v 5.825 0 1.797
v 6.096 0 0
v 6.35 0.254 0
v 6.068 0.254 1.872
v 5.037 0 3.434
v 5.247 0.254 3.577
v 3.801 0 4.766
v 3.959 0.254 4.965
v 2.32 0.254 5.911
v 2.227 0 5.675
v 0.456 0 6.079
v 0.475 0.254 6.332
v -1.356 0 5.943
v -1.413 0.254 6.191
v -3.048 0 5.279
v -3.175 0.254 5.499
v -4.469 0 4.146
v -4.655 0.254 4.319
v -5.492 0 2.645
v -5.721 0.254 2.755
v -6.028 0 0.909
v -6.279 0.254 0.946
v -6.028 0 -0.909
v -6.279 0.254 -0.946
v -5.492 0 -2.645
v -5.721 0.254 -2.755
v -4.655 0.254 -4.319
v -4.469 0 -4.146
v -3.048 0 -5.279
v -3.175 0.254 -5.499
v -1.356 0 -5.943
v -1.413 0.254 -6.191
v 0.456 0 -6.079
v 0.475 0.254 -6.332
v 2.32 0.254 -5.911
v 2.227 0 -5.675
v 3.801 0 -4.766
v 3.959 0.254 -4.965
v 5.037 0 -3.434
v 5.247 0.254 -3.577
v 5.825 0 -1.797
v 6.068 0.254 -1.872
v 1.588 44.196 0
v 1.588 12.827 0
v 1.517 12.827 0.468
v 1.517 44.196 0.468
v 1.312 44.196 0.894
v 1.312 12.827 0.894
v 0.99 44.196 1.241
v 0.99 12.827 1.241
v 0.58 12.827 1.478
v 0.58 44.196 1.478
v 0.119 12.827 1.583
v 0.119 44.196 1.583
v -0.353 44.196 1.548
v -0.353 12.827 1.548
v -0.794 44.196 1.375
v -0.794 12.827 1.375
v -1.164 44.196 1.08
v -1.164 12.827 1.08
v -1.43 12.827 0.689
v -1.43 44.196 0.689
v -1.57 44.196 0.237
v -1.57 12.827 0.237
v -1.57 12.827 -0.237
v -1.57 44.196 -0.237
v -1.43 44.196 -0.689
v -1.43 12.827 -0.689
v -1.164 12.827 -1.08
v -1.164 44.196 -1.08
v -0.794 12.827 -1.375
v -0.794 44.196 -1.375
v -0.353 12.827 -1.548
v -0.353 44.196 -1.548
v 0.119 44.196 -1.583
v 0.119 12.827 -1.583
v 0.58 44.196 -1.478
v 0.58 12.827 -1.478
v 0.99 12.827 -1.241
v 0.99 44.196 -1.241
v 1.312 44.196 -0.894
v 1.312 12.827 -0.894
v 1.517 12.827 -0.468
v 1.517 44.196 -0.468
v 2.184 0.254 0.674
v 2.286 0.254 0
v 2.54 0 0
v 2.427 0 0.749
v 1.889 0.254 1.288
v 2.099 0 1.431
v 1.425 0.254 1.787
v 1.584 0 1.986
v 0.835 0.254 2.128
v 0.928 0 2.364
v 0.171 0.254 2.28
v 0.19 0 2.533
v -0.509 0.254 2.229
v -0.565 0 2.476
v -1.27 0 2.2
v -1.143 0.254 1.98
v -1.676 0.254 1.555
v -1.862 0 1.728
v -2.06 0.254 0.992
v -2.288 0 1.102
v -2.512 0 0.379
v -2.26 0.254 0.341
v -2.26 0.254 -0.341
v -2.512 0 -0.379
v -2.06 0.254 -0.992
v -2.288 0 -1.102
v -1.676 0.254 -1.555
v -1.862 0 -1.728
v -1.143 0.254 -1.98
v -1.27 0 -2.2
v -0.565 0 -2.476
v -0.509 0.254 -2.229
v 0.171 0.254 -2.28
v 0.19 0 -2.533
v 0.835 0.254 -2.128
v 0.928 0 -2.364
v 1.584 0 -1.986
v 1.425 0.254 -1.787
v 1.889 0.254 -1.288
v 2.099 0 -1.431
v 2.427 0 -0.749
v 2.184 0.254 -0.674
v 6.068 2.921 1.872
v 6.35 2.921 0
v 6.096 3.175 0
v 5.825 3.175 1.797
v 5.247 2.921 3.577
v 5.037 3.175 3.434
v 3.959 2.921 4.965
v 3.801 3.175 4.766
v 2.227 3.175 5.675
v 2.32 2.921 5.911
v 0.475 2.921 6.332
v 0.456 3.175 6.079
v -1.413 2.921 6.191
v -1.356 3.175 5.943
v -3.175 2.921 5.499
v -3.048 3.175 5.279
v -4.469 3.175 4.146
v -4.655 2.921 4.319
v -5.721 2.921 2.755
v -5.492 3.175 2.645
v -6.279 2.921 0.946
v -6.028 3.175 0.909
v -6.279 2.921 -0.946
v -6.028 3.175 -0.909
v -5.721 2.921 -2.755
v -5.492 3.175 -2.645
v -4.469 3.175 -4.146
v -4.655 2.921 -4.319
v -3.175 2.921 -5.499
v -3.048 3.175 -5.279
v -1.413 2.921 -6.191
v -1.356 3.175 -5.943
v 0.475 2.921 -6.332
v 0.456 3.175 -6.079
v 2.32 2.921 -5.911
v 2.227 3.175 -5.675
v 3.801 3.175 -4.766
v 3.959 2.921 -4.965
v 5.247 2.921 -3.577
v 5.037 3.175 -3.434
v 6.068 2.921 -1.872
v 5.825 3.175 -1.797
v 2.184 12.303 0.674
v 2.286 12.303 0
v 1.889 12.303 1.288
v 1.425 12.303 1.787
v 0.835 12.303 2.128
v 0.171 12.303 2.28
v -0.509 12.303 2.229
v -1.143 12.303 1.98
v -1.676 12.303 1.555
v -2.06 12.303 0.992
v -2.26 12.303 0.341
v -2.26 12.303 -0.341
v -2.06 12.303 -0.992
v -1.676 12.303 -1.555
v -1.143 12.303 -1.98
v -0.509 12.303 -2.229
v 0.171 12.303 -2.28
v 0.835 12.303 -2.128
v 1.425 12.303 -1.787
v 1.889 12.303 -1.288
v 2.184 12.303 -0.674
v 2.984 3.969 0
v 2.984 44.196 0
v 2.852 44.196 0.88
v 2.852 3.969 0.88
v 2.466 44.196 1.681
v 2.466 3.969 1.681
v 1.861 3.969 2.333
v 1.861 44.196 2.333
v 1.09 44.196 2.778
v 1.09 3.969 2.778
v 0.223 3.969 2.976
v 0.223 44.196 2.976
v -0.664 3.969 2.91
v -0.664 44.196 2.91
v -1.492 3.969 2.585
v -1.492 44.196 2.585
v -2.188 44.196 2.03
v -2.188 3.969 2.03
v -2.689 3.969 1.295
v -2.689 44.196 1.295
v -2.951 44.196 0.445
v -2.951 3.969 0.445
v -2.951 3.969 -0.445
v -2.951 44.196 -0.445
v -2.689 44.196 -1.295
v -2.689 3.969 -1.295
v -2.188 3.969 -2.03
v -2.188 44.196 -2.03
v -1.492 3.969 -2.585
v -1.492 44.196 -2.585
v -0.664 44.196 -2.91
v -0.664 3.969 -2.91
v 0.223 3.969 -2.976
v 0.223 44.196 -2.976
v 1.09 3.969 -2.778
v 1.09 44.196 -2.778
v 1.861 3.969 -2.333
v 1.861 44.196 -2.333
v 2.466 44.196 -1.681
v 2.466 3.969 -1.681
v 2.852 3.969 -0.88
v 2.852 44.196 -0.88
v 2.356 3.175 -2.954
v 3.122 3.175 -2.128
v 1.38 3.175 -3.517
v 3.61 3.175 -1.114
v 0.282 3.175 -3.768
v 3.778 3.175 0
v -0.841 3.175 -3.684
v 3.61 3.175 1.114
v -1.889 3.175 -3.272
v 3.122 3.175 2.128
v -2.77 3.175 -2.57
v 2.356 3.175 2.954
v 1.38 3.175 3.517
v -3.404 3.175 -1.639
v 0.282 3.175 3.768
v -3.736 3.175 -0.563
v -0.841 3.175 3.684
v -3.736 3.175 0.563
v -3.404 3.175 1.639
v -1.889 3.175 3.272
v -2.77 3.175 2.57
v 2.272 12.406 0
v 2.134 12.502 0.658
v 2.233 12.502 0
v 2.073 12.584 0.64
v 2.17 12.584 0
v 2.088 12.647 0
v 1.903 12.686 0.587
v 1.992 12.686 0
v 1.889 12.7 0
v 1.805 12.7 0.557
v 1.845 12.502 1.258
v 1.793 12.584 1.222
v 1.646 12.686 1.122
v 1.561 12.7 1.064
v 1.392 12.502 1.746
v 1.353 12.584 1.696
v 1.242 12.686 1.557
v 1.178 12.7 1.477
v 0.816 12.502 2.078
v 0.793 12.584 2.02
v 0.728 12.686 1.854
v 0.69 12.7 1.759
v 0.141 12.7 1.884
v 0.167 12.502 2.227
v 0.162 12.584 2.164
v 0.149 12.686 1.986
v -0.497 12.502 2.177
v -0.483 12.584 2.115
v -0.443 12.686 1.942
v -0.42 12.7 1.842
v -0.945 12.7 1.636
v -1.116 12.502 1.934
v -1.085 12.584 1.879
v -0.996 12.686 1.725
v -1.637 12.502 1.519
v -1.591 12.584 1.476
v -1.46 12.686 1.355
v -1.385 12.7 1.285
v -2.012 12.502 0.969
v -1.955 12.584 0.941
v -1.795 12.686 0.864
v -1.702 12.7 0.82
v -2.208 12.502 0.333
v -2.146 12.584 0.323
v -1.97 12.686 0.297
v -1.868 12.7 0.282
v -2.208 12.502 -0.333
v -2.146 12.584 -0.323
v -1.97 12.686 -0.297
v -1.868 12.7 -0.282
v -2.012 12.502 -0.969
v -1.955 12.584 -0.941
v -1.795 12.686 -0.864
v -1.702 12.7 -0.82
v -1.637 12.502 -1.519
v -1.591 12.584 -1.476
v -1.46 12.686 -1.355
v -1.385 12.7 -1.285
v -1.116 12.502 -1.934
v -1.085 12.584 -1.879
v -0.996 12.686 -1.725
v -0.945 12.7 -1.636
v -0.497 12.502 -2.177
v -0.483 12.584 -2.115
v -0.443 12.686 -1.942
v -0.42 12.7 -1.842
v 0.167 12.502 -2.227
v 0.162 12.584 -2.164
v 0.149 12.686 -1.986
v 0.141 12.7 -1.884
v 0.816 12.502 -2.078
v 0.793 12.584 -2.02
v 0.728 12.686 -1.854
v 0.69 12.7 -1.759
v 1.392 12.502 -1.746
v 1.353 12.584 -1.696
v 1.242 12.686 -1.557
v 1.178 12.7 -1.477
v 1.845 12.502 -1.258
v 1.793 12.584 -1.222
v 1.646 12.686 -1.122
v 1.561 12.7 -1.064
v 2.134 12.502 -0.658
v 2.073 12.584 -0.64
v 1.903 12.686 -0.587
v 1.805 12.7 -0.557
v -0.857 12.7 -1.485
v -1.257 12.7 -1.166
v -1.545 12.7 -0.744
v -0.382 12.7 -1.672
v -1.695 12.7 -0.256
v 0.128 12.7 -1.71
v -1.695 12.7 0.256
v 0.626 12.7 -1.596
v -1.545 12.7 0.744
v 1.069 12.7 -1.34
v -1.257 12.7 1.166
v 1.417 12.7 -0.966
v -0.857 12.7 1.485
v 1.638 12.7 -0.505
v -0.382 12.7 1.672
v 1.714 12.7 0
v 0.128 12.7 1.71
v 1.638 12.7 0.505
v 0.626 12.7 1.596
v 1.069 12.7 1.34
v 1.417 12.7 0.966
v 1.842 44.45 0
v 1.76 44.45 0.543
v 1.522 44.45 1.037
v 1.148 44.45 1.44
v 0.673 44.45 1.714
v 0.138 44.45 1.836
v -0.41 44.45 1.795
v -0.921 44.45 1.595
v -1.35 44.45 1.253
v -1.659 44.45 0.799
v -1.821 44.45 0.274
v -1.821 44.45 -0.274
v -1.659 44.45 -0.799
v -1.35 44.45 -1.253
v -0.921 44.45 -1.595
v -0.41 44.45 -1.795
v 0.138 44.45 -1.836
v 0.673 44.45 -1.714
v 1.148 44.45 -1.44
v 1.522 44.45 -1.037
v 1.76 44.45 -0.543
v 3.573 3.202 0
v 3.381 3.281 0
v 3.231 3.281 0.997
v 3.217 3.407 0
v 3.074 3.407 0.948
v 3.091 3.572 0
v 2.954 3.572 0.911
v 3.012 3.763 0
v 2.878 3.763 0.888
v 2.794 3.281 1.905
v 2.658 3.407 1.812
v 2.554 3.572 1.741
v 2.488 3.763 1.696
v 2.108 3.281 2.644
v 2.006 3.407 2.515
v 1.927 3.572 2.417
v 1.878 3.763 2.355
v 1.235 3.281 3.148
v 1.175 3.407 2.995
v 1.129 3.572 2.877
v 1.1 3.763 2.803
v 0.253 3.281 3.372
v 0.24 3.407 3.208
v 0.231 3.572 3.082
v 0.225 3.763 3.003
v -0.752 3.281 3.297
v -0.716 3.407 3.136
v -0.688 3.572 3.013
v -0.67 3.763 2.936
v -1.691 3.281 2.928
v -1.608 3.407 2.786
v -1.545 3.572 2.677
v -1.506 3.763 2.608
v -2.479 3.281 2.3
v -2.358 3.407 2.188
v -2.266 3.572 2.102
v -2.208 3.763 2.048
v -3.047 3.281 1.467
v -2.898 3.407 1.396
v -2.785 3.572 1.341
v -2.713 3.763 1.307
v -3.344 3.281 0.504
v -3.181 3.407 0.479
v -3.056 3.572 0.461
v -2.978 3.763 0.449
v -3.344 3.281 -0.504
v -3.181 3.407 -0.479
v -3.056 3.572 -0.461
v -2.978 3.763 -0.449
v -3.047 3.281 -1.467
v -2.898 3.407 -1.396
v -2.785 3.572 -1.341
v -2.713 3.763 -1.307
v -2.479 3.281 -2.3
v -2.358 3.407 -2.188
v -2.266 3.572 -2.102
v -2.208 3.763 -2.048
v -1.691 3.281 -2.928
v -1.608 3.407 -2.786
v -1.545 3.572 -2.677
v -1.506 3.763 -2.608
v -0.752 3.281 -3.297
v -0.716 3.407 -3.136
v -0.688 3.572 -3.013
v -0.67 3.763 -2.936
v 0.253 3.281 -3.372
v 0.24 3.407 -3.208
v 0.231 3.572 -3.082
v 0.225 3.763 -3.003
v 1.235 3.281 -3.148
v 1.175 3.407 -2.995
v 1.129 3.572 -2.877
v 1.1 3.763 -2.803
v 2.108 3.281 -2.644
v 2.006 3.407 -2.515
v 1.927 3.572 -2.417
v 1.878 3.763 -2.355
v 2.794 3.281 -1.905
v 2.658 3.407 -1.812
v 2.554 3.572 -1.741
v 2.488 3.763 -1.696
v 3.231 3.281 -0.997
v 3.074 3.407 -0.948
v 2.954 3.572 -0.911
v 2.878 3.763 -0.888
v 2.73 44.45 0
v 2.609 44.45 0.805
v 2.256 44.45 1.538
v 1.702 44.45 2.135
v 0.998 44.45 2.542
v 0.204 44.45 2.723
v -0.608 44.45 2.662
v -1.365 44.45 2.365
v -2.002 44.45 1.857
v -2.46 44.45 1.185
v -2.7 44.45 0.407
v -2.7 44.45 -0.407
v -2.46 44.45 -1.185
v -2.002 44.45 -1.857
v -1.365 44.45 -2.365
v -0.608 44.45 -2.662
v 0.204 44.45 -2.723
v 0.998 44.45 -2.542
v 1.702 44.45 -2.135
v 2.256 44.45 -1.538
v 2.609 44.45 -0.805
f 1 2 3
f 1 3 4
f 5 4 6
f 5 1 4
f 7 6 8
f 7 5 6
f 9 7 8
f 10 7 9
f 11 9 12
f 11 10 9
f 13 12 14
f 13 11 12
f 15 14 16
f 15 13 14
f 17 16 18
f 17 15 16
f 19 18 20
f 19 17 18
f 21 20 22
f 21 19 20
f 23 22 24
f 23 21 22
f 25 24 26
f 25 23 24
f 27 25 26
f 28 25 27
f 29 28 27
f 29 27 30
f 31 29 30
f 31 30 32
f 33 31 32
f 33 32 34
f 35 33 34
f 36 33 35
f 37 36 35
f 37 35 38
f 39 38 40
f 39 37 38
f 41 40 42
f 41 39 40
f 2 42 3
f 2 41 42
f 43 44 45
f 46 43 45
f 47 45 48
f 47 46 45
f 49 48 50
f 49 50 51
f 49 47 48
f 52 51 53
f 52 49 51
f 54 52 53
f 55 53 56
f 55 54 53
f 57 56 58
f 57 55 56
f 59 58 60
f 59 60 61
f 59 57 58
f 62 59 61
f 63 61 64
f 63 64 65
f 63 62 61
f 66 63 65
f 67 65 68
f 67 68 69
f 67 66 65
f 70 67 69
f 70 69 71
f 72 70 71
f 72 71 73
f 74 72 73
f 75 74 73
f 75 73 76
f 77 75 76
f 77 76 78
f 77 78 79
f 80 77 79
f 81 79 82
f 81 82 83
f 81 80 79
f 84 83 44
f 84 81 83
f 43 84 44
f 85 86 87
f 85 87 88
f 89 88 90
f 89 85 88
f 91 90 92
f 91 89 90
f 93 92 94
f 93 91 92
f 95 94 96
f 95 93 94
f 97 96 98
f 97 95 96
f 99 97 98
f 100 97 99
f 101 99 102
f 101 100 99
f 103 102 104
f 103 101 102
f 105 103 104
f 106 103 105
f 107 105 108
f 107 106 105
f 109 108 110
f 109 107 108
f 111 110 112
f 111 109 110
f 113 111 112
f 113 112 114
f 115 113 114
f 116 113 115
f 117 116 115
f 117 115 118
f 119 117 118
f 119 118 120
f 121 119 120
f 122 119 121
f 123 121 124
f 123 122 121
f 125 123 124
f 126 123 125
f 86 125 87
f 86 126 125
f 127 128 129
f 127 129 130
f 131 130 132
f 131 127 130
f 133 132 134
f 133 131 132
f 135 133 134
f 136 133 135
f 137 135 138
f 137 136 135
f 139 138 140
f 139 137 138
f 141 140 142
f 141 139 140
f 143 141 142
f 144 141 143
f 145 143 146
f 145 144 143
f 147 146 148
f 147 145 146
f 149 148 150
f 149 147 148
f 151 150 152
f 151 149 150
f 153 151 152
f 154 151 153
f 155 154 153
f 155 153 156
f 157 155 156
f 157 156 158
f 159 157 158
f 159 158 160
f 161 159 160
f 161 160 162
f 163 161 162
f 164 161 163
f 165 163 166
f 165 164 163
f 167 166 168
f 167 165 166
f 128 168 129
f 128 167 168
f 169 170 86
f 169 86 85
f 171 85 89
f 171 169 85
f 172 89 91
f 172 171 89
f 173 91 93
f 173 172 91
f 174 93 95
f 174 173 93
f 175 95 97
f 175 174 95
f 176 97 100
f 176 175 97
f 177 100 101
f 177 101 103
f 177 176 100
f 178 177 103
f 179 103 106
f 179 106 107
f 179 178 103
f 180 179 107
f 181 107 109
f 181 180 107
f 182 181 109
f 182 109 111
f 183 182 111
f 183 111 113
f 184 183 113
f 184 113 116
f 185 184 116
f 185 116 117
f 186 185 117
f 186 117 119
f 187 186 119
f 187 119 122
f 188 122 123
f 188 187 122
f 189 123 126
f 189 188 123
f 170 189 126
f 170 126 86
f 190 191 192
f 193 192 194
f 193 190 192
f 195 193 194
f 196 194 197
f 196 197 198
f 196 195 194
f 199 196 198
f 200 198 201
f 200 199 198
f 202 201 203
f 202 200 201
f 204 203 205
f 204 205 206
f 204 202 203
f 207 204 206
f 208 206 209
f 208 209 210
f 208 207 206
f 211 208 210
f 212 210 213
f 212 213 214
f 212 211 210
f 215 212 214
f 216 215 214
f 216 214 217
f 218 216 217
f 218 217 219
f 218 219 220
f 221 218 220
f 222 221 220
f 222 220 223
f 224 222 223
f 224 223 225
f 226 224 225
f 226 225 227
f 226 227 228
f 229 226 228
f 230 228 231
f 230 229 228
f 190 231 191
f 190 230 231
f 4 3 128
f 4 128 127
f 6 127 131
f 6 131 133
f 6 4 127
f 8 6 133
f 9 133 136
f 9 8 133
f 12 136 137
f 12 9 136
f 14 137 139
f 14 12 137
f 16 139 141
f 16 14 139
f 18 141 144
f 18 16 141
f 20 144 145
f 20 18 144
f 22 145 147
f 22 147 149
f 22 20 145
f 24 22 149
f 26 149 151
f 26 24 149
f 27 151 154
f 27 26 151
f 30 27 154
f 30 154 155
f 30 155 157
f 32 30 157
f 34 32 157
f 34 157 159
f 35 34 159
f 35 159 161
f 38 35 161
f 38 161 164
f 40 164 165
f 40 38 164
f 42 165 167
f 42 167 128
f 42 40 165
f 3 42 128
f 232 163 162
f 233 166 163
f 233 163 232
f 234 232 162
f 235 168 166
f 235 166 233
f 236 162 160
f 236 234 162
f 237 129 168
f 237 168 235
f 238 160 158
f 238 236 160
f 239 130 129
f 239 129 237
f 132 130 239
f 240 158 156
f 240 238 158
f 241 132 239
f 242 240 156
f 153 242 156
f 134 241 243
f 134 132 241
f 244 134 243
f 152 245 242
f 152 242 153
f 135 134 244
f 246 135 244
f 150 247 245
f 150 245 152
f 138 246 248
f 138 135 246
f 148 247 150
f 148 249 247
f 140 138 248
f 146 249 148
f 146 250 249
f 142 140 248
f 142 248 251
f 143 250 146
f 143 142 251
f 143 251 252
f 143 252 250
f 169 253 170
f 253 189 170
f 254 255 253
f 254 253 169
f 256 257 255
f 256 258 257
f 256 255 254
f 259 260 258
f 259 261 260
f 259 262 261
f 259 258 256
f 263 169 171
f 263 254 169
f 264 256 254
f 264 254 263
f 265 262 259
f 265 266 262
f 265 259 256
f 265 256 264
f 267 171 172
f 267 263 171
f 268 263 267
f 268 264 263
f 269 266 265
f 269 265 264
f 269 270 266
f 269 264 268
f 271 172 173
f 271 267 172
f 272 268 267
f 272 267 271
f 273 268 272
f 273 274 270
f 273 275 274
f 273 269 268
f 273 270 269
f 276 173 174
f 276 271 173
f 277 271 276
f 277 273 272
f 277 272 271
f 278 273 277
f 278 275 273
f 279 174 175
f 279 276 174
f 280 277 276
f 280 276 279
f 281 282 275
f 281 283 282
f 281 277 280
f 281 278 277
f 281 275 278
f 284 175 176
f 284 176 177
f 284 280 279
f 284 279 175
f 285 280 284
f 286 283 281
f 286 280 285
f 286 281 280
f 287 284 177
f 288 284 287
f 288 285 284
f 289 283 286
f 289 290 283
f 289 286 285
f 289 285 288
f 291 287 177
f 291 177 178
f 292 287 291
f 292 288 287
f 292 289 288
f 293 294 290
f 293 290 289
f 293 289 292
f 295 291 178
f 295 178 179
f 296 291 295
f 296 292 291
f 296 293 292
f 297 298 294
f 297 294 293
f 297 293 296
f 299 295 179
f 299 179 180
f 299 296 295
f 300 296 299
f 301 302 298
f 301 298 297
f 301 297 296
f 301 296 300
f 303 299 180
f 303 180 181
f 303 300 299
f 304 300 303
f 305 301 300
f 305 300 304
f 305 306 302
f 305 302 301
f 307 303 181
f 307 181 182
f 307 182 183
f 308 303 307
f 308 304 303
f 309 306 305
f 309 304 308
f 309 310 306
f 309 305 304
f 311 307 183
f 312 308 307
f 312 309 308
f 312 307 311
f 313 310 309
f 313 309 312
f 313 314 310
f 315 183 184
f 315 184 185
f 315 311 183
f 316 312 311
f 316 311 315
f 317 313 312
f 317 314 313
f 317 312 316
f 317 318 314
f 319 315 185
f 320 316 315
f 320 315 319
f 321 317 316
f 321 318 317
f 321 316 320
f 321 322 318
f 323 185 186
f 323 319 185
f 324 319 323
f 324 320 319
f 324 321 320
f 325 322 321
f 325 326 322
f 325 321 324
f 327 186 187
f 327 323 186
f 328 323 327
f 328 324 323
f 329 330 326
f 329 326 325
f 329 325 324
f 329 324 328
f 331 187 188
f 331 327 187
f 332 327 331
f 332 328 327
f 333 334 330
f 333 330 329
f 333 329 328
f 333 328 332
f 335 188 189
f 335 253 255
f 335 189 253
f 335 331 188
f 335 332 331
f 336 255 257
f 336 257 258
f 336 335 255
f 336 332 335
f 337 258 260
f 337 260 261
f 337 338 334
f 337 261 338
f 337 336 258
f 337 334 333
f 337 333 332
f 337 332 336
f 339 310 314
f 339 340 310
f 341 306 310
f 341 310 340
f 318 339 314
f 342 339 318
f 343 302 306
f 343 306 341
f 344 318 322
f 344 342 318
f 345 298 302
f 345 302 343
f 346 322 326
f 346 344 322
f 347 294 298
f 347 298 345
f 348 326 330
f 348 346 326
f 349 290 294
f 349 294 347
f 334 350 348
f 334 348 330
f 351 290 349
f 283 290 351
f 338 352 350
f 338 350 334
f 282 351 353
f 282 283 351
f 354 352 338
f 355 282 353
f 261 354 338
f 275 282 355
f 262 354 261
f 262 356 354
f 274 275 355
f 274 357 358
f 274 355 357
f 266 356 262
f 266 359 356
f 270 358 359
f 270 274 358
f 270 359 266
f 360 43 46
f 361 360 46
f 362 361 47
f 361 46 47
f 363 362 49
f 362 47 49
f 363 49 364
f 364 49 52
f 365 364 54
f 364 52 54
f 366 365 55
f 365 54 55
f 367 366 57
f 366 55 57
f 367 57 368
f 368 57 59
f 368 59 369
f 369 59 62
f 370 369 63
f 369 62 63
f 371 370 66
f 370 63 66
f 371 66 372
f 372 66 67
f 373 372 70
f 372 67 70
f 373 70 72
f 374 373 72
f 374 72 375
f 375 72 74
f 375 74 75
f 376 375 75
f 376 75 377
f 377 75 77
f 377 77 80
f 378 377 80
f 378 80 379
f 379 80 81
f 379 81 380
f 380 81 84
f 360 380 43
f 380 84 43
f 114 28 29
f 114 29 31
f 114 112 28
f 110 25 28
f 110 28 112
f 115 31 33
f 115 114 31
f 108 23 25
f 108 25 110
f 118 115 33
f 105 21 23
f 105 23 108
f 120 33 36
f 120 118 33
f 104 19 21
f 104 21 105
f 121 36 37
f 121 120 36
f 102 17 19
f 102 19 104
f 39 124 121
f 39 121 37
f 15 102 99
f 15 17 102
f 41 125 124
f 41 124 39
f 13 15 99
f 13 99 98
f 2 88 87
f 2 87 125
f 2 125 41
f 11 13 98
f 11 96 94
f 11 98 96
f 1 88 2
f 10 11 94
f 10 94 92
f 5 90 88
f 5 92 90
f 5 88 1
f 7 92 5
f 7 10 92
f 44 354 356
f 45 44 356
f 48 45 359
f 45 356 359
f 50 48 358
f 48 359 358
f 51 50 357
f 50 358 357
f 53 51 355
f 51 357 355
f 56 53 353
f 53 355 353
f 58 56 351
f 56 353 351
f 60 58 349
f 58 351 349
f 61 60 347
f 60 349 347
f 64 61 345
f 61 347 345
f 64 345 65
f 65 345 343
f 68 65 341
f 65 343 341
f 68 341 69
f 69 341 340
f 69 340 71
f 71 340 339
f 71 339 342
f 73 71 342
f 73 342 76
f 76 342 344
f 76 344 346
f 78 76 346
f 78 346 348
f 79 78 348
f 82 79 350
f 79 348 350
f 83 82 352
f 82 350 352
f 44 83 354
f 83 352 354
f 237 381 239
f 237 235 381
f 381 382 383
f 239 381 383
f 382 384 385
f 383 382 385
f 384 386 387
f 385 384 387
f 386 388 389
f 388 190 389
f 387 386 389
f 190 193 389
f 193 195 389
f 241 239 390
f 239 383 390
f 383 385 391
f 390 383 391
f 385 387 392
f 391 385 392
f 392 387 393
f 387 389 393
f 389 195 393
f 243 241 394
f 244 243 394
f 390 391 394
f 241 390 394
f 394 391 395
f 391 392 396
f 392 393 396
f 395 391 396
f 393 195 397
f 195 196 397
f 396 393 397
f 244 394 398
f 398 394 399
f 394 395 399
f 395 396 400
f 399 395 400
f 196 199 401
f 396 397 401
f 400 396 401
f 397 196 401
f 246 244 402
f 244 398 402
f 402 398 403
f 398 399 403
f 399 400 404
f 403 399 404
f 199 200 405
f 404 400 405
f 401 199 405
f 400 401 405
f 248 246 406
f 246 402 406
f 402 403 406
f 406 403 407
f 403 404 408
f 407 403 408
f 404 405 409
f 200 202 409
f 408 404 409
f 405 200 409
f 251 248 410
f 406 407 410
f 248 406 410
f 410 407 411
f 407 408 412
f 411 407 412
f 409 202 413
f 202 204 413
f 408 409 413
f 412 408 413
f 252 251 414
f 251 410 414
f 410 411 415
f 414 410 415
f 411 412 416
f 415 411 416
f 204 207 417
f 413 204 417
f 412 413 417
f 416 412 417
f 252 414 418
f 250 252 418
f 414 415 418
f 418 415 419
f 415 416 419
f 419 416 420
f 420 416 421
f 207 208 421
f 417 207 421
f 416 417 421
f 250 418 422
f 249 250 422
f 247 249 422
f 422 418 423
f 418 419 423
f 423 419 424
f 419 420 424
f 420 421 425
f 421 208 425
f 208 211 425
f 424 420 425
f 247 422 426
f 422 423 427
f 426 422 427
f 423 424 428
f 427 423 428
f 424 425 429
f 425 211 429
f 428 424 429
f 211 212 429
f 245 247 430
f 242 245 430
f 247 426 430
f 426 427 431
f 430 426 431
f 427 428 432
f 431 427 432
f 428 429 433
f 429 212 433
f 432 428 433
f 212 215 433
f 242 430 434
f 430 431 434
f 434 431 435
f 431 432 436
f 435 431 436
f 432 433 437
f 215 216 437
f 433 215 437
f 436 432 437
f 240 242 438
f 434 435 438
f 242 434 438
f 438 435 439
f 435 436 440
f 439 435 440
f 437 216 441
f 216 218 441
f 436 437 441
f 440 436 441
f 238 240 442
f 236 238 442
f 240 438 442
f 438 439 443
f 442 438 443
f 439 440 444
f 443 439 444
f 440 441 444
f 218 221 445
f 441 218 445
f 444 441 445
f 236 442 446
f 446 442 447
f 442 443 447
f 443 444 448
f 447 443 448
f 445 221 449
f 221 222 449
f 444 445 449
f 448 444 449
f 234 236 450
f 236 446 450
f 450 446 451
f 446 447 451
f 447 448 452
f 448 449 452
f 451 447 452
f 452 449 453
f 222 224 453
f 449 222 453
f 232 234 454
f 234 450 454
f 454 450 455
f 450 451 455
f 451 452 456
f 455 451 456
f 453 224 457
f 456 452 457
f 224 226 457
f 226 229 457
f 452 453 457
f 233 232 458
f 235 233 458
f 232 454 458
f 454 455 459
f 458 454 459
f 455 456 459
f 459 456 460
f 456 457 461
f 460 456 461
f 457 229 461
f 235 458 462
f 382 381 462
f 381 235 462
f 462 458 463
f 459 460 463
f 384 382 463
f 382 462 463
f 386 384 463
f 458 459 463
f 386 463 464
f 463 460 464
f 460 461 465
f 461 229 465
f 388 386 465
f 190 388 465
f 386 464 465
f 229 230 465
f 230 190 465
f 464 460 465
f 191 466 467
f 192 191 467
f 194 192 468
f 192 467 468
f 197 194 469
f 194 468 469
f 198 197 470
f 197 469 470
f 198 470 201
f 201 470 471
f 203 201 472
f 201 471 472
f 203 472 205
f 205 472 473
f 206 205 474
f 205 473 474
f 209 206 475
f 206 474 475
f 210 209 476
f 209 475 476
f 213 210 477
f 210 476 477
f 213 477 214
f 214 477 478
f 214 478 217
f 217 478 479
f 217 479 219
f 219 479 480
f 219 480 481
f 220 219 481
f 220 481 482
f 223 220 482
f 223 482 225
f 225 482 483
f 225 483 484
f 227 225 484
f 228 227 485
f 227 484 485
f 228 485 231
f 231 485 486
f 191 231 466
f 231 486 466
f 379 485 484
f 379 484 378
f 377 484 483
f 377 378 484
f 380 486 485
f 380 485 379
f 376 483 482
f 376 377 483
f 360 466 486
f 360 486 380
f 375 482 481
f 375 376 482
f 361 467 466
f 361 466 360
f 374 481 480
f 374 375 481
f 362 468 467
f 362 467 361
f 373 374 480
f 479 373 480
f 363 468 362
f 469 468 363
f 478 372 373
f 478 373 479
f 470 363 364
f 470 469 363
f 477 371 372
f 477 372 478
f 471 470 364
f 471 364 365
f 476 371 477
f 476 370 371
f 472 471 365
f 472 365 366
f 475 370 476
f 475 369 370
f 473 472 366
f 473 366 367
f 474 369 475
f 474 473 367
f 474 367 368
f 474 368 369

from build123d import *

# Parameters (mm, degrees)
FILLET1_R     = 0.396875
FILLET2_R     = 0.79375
CHAMFER1_SIZE = 0.254
CHAMFER2_SIZE = 0.127


with BuildPart() as part:
    # Sketch1 → Revolve1 (revolve)
    with BuildSketch(Plane.XY):
        Polygon((2.286, 0), (2.286, 12.7), (1.5875, 12.7), (1.5875, 44.45), (2.9845, 44.45), (2.9845, 3.175), (6.35, 3.175), (6.35, 0), align=None)
    revolve(axis=Axis((0, 5.299175628, 0), (0, -1, 0)))

    # Fillet1
    fillet1_edges = [part.edges().sort_by_distance(p)[0] for p in [
        (-2.286, 12.7, 0),
    ]]
    fillet(fillet1_edges, radius=FILLET1_R)

    # Fillet2
    fillet2_edges = [part.edges().sort_by_distance(p)[0] for p in [
        (-2.9845, 3.175, 0),
    ]]
    fillet(fillet2_edges, radius=FILLET2_R)

    # Chamfer1
    chamfer1_edges = [part.edges().sort_by_distance(p)[0] for p in [
        (-6.35, 0, 0),
        (-6.35, 3.175, 0),
        (-2.9845, 44.45, 0),
        (-1.5875, 44.45, 0),
        (-2.286, 0, 0),
    ]]
    chamfer(chamfer1_edges, length=CHAMFER1_SIZE)

    # Chamfer2
    chamfer2_edges = [part.edges().sort_by_distance(p)[0] for p in [
        (-1.5875, 12.7, 0),
    ]]
    chamfer(chamfer2_edges, length=CHAMFER2_SIZE)


solid = part.part
